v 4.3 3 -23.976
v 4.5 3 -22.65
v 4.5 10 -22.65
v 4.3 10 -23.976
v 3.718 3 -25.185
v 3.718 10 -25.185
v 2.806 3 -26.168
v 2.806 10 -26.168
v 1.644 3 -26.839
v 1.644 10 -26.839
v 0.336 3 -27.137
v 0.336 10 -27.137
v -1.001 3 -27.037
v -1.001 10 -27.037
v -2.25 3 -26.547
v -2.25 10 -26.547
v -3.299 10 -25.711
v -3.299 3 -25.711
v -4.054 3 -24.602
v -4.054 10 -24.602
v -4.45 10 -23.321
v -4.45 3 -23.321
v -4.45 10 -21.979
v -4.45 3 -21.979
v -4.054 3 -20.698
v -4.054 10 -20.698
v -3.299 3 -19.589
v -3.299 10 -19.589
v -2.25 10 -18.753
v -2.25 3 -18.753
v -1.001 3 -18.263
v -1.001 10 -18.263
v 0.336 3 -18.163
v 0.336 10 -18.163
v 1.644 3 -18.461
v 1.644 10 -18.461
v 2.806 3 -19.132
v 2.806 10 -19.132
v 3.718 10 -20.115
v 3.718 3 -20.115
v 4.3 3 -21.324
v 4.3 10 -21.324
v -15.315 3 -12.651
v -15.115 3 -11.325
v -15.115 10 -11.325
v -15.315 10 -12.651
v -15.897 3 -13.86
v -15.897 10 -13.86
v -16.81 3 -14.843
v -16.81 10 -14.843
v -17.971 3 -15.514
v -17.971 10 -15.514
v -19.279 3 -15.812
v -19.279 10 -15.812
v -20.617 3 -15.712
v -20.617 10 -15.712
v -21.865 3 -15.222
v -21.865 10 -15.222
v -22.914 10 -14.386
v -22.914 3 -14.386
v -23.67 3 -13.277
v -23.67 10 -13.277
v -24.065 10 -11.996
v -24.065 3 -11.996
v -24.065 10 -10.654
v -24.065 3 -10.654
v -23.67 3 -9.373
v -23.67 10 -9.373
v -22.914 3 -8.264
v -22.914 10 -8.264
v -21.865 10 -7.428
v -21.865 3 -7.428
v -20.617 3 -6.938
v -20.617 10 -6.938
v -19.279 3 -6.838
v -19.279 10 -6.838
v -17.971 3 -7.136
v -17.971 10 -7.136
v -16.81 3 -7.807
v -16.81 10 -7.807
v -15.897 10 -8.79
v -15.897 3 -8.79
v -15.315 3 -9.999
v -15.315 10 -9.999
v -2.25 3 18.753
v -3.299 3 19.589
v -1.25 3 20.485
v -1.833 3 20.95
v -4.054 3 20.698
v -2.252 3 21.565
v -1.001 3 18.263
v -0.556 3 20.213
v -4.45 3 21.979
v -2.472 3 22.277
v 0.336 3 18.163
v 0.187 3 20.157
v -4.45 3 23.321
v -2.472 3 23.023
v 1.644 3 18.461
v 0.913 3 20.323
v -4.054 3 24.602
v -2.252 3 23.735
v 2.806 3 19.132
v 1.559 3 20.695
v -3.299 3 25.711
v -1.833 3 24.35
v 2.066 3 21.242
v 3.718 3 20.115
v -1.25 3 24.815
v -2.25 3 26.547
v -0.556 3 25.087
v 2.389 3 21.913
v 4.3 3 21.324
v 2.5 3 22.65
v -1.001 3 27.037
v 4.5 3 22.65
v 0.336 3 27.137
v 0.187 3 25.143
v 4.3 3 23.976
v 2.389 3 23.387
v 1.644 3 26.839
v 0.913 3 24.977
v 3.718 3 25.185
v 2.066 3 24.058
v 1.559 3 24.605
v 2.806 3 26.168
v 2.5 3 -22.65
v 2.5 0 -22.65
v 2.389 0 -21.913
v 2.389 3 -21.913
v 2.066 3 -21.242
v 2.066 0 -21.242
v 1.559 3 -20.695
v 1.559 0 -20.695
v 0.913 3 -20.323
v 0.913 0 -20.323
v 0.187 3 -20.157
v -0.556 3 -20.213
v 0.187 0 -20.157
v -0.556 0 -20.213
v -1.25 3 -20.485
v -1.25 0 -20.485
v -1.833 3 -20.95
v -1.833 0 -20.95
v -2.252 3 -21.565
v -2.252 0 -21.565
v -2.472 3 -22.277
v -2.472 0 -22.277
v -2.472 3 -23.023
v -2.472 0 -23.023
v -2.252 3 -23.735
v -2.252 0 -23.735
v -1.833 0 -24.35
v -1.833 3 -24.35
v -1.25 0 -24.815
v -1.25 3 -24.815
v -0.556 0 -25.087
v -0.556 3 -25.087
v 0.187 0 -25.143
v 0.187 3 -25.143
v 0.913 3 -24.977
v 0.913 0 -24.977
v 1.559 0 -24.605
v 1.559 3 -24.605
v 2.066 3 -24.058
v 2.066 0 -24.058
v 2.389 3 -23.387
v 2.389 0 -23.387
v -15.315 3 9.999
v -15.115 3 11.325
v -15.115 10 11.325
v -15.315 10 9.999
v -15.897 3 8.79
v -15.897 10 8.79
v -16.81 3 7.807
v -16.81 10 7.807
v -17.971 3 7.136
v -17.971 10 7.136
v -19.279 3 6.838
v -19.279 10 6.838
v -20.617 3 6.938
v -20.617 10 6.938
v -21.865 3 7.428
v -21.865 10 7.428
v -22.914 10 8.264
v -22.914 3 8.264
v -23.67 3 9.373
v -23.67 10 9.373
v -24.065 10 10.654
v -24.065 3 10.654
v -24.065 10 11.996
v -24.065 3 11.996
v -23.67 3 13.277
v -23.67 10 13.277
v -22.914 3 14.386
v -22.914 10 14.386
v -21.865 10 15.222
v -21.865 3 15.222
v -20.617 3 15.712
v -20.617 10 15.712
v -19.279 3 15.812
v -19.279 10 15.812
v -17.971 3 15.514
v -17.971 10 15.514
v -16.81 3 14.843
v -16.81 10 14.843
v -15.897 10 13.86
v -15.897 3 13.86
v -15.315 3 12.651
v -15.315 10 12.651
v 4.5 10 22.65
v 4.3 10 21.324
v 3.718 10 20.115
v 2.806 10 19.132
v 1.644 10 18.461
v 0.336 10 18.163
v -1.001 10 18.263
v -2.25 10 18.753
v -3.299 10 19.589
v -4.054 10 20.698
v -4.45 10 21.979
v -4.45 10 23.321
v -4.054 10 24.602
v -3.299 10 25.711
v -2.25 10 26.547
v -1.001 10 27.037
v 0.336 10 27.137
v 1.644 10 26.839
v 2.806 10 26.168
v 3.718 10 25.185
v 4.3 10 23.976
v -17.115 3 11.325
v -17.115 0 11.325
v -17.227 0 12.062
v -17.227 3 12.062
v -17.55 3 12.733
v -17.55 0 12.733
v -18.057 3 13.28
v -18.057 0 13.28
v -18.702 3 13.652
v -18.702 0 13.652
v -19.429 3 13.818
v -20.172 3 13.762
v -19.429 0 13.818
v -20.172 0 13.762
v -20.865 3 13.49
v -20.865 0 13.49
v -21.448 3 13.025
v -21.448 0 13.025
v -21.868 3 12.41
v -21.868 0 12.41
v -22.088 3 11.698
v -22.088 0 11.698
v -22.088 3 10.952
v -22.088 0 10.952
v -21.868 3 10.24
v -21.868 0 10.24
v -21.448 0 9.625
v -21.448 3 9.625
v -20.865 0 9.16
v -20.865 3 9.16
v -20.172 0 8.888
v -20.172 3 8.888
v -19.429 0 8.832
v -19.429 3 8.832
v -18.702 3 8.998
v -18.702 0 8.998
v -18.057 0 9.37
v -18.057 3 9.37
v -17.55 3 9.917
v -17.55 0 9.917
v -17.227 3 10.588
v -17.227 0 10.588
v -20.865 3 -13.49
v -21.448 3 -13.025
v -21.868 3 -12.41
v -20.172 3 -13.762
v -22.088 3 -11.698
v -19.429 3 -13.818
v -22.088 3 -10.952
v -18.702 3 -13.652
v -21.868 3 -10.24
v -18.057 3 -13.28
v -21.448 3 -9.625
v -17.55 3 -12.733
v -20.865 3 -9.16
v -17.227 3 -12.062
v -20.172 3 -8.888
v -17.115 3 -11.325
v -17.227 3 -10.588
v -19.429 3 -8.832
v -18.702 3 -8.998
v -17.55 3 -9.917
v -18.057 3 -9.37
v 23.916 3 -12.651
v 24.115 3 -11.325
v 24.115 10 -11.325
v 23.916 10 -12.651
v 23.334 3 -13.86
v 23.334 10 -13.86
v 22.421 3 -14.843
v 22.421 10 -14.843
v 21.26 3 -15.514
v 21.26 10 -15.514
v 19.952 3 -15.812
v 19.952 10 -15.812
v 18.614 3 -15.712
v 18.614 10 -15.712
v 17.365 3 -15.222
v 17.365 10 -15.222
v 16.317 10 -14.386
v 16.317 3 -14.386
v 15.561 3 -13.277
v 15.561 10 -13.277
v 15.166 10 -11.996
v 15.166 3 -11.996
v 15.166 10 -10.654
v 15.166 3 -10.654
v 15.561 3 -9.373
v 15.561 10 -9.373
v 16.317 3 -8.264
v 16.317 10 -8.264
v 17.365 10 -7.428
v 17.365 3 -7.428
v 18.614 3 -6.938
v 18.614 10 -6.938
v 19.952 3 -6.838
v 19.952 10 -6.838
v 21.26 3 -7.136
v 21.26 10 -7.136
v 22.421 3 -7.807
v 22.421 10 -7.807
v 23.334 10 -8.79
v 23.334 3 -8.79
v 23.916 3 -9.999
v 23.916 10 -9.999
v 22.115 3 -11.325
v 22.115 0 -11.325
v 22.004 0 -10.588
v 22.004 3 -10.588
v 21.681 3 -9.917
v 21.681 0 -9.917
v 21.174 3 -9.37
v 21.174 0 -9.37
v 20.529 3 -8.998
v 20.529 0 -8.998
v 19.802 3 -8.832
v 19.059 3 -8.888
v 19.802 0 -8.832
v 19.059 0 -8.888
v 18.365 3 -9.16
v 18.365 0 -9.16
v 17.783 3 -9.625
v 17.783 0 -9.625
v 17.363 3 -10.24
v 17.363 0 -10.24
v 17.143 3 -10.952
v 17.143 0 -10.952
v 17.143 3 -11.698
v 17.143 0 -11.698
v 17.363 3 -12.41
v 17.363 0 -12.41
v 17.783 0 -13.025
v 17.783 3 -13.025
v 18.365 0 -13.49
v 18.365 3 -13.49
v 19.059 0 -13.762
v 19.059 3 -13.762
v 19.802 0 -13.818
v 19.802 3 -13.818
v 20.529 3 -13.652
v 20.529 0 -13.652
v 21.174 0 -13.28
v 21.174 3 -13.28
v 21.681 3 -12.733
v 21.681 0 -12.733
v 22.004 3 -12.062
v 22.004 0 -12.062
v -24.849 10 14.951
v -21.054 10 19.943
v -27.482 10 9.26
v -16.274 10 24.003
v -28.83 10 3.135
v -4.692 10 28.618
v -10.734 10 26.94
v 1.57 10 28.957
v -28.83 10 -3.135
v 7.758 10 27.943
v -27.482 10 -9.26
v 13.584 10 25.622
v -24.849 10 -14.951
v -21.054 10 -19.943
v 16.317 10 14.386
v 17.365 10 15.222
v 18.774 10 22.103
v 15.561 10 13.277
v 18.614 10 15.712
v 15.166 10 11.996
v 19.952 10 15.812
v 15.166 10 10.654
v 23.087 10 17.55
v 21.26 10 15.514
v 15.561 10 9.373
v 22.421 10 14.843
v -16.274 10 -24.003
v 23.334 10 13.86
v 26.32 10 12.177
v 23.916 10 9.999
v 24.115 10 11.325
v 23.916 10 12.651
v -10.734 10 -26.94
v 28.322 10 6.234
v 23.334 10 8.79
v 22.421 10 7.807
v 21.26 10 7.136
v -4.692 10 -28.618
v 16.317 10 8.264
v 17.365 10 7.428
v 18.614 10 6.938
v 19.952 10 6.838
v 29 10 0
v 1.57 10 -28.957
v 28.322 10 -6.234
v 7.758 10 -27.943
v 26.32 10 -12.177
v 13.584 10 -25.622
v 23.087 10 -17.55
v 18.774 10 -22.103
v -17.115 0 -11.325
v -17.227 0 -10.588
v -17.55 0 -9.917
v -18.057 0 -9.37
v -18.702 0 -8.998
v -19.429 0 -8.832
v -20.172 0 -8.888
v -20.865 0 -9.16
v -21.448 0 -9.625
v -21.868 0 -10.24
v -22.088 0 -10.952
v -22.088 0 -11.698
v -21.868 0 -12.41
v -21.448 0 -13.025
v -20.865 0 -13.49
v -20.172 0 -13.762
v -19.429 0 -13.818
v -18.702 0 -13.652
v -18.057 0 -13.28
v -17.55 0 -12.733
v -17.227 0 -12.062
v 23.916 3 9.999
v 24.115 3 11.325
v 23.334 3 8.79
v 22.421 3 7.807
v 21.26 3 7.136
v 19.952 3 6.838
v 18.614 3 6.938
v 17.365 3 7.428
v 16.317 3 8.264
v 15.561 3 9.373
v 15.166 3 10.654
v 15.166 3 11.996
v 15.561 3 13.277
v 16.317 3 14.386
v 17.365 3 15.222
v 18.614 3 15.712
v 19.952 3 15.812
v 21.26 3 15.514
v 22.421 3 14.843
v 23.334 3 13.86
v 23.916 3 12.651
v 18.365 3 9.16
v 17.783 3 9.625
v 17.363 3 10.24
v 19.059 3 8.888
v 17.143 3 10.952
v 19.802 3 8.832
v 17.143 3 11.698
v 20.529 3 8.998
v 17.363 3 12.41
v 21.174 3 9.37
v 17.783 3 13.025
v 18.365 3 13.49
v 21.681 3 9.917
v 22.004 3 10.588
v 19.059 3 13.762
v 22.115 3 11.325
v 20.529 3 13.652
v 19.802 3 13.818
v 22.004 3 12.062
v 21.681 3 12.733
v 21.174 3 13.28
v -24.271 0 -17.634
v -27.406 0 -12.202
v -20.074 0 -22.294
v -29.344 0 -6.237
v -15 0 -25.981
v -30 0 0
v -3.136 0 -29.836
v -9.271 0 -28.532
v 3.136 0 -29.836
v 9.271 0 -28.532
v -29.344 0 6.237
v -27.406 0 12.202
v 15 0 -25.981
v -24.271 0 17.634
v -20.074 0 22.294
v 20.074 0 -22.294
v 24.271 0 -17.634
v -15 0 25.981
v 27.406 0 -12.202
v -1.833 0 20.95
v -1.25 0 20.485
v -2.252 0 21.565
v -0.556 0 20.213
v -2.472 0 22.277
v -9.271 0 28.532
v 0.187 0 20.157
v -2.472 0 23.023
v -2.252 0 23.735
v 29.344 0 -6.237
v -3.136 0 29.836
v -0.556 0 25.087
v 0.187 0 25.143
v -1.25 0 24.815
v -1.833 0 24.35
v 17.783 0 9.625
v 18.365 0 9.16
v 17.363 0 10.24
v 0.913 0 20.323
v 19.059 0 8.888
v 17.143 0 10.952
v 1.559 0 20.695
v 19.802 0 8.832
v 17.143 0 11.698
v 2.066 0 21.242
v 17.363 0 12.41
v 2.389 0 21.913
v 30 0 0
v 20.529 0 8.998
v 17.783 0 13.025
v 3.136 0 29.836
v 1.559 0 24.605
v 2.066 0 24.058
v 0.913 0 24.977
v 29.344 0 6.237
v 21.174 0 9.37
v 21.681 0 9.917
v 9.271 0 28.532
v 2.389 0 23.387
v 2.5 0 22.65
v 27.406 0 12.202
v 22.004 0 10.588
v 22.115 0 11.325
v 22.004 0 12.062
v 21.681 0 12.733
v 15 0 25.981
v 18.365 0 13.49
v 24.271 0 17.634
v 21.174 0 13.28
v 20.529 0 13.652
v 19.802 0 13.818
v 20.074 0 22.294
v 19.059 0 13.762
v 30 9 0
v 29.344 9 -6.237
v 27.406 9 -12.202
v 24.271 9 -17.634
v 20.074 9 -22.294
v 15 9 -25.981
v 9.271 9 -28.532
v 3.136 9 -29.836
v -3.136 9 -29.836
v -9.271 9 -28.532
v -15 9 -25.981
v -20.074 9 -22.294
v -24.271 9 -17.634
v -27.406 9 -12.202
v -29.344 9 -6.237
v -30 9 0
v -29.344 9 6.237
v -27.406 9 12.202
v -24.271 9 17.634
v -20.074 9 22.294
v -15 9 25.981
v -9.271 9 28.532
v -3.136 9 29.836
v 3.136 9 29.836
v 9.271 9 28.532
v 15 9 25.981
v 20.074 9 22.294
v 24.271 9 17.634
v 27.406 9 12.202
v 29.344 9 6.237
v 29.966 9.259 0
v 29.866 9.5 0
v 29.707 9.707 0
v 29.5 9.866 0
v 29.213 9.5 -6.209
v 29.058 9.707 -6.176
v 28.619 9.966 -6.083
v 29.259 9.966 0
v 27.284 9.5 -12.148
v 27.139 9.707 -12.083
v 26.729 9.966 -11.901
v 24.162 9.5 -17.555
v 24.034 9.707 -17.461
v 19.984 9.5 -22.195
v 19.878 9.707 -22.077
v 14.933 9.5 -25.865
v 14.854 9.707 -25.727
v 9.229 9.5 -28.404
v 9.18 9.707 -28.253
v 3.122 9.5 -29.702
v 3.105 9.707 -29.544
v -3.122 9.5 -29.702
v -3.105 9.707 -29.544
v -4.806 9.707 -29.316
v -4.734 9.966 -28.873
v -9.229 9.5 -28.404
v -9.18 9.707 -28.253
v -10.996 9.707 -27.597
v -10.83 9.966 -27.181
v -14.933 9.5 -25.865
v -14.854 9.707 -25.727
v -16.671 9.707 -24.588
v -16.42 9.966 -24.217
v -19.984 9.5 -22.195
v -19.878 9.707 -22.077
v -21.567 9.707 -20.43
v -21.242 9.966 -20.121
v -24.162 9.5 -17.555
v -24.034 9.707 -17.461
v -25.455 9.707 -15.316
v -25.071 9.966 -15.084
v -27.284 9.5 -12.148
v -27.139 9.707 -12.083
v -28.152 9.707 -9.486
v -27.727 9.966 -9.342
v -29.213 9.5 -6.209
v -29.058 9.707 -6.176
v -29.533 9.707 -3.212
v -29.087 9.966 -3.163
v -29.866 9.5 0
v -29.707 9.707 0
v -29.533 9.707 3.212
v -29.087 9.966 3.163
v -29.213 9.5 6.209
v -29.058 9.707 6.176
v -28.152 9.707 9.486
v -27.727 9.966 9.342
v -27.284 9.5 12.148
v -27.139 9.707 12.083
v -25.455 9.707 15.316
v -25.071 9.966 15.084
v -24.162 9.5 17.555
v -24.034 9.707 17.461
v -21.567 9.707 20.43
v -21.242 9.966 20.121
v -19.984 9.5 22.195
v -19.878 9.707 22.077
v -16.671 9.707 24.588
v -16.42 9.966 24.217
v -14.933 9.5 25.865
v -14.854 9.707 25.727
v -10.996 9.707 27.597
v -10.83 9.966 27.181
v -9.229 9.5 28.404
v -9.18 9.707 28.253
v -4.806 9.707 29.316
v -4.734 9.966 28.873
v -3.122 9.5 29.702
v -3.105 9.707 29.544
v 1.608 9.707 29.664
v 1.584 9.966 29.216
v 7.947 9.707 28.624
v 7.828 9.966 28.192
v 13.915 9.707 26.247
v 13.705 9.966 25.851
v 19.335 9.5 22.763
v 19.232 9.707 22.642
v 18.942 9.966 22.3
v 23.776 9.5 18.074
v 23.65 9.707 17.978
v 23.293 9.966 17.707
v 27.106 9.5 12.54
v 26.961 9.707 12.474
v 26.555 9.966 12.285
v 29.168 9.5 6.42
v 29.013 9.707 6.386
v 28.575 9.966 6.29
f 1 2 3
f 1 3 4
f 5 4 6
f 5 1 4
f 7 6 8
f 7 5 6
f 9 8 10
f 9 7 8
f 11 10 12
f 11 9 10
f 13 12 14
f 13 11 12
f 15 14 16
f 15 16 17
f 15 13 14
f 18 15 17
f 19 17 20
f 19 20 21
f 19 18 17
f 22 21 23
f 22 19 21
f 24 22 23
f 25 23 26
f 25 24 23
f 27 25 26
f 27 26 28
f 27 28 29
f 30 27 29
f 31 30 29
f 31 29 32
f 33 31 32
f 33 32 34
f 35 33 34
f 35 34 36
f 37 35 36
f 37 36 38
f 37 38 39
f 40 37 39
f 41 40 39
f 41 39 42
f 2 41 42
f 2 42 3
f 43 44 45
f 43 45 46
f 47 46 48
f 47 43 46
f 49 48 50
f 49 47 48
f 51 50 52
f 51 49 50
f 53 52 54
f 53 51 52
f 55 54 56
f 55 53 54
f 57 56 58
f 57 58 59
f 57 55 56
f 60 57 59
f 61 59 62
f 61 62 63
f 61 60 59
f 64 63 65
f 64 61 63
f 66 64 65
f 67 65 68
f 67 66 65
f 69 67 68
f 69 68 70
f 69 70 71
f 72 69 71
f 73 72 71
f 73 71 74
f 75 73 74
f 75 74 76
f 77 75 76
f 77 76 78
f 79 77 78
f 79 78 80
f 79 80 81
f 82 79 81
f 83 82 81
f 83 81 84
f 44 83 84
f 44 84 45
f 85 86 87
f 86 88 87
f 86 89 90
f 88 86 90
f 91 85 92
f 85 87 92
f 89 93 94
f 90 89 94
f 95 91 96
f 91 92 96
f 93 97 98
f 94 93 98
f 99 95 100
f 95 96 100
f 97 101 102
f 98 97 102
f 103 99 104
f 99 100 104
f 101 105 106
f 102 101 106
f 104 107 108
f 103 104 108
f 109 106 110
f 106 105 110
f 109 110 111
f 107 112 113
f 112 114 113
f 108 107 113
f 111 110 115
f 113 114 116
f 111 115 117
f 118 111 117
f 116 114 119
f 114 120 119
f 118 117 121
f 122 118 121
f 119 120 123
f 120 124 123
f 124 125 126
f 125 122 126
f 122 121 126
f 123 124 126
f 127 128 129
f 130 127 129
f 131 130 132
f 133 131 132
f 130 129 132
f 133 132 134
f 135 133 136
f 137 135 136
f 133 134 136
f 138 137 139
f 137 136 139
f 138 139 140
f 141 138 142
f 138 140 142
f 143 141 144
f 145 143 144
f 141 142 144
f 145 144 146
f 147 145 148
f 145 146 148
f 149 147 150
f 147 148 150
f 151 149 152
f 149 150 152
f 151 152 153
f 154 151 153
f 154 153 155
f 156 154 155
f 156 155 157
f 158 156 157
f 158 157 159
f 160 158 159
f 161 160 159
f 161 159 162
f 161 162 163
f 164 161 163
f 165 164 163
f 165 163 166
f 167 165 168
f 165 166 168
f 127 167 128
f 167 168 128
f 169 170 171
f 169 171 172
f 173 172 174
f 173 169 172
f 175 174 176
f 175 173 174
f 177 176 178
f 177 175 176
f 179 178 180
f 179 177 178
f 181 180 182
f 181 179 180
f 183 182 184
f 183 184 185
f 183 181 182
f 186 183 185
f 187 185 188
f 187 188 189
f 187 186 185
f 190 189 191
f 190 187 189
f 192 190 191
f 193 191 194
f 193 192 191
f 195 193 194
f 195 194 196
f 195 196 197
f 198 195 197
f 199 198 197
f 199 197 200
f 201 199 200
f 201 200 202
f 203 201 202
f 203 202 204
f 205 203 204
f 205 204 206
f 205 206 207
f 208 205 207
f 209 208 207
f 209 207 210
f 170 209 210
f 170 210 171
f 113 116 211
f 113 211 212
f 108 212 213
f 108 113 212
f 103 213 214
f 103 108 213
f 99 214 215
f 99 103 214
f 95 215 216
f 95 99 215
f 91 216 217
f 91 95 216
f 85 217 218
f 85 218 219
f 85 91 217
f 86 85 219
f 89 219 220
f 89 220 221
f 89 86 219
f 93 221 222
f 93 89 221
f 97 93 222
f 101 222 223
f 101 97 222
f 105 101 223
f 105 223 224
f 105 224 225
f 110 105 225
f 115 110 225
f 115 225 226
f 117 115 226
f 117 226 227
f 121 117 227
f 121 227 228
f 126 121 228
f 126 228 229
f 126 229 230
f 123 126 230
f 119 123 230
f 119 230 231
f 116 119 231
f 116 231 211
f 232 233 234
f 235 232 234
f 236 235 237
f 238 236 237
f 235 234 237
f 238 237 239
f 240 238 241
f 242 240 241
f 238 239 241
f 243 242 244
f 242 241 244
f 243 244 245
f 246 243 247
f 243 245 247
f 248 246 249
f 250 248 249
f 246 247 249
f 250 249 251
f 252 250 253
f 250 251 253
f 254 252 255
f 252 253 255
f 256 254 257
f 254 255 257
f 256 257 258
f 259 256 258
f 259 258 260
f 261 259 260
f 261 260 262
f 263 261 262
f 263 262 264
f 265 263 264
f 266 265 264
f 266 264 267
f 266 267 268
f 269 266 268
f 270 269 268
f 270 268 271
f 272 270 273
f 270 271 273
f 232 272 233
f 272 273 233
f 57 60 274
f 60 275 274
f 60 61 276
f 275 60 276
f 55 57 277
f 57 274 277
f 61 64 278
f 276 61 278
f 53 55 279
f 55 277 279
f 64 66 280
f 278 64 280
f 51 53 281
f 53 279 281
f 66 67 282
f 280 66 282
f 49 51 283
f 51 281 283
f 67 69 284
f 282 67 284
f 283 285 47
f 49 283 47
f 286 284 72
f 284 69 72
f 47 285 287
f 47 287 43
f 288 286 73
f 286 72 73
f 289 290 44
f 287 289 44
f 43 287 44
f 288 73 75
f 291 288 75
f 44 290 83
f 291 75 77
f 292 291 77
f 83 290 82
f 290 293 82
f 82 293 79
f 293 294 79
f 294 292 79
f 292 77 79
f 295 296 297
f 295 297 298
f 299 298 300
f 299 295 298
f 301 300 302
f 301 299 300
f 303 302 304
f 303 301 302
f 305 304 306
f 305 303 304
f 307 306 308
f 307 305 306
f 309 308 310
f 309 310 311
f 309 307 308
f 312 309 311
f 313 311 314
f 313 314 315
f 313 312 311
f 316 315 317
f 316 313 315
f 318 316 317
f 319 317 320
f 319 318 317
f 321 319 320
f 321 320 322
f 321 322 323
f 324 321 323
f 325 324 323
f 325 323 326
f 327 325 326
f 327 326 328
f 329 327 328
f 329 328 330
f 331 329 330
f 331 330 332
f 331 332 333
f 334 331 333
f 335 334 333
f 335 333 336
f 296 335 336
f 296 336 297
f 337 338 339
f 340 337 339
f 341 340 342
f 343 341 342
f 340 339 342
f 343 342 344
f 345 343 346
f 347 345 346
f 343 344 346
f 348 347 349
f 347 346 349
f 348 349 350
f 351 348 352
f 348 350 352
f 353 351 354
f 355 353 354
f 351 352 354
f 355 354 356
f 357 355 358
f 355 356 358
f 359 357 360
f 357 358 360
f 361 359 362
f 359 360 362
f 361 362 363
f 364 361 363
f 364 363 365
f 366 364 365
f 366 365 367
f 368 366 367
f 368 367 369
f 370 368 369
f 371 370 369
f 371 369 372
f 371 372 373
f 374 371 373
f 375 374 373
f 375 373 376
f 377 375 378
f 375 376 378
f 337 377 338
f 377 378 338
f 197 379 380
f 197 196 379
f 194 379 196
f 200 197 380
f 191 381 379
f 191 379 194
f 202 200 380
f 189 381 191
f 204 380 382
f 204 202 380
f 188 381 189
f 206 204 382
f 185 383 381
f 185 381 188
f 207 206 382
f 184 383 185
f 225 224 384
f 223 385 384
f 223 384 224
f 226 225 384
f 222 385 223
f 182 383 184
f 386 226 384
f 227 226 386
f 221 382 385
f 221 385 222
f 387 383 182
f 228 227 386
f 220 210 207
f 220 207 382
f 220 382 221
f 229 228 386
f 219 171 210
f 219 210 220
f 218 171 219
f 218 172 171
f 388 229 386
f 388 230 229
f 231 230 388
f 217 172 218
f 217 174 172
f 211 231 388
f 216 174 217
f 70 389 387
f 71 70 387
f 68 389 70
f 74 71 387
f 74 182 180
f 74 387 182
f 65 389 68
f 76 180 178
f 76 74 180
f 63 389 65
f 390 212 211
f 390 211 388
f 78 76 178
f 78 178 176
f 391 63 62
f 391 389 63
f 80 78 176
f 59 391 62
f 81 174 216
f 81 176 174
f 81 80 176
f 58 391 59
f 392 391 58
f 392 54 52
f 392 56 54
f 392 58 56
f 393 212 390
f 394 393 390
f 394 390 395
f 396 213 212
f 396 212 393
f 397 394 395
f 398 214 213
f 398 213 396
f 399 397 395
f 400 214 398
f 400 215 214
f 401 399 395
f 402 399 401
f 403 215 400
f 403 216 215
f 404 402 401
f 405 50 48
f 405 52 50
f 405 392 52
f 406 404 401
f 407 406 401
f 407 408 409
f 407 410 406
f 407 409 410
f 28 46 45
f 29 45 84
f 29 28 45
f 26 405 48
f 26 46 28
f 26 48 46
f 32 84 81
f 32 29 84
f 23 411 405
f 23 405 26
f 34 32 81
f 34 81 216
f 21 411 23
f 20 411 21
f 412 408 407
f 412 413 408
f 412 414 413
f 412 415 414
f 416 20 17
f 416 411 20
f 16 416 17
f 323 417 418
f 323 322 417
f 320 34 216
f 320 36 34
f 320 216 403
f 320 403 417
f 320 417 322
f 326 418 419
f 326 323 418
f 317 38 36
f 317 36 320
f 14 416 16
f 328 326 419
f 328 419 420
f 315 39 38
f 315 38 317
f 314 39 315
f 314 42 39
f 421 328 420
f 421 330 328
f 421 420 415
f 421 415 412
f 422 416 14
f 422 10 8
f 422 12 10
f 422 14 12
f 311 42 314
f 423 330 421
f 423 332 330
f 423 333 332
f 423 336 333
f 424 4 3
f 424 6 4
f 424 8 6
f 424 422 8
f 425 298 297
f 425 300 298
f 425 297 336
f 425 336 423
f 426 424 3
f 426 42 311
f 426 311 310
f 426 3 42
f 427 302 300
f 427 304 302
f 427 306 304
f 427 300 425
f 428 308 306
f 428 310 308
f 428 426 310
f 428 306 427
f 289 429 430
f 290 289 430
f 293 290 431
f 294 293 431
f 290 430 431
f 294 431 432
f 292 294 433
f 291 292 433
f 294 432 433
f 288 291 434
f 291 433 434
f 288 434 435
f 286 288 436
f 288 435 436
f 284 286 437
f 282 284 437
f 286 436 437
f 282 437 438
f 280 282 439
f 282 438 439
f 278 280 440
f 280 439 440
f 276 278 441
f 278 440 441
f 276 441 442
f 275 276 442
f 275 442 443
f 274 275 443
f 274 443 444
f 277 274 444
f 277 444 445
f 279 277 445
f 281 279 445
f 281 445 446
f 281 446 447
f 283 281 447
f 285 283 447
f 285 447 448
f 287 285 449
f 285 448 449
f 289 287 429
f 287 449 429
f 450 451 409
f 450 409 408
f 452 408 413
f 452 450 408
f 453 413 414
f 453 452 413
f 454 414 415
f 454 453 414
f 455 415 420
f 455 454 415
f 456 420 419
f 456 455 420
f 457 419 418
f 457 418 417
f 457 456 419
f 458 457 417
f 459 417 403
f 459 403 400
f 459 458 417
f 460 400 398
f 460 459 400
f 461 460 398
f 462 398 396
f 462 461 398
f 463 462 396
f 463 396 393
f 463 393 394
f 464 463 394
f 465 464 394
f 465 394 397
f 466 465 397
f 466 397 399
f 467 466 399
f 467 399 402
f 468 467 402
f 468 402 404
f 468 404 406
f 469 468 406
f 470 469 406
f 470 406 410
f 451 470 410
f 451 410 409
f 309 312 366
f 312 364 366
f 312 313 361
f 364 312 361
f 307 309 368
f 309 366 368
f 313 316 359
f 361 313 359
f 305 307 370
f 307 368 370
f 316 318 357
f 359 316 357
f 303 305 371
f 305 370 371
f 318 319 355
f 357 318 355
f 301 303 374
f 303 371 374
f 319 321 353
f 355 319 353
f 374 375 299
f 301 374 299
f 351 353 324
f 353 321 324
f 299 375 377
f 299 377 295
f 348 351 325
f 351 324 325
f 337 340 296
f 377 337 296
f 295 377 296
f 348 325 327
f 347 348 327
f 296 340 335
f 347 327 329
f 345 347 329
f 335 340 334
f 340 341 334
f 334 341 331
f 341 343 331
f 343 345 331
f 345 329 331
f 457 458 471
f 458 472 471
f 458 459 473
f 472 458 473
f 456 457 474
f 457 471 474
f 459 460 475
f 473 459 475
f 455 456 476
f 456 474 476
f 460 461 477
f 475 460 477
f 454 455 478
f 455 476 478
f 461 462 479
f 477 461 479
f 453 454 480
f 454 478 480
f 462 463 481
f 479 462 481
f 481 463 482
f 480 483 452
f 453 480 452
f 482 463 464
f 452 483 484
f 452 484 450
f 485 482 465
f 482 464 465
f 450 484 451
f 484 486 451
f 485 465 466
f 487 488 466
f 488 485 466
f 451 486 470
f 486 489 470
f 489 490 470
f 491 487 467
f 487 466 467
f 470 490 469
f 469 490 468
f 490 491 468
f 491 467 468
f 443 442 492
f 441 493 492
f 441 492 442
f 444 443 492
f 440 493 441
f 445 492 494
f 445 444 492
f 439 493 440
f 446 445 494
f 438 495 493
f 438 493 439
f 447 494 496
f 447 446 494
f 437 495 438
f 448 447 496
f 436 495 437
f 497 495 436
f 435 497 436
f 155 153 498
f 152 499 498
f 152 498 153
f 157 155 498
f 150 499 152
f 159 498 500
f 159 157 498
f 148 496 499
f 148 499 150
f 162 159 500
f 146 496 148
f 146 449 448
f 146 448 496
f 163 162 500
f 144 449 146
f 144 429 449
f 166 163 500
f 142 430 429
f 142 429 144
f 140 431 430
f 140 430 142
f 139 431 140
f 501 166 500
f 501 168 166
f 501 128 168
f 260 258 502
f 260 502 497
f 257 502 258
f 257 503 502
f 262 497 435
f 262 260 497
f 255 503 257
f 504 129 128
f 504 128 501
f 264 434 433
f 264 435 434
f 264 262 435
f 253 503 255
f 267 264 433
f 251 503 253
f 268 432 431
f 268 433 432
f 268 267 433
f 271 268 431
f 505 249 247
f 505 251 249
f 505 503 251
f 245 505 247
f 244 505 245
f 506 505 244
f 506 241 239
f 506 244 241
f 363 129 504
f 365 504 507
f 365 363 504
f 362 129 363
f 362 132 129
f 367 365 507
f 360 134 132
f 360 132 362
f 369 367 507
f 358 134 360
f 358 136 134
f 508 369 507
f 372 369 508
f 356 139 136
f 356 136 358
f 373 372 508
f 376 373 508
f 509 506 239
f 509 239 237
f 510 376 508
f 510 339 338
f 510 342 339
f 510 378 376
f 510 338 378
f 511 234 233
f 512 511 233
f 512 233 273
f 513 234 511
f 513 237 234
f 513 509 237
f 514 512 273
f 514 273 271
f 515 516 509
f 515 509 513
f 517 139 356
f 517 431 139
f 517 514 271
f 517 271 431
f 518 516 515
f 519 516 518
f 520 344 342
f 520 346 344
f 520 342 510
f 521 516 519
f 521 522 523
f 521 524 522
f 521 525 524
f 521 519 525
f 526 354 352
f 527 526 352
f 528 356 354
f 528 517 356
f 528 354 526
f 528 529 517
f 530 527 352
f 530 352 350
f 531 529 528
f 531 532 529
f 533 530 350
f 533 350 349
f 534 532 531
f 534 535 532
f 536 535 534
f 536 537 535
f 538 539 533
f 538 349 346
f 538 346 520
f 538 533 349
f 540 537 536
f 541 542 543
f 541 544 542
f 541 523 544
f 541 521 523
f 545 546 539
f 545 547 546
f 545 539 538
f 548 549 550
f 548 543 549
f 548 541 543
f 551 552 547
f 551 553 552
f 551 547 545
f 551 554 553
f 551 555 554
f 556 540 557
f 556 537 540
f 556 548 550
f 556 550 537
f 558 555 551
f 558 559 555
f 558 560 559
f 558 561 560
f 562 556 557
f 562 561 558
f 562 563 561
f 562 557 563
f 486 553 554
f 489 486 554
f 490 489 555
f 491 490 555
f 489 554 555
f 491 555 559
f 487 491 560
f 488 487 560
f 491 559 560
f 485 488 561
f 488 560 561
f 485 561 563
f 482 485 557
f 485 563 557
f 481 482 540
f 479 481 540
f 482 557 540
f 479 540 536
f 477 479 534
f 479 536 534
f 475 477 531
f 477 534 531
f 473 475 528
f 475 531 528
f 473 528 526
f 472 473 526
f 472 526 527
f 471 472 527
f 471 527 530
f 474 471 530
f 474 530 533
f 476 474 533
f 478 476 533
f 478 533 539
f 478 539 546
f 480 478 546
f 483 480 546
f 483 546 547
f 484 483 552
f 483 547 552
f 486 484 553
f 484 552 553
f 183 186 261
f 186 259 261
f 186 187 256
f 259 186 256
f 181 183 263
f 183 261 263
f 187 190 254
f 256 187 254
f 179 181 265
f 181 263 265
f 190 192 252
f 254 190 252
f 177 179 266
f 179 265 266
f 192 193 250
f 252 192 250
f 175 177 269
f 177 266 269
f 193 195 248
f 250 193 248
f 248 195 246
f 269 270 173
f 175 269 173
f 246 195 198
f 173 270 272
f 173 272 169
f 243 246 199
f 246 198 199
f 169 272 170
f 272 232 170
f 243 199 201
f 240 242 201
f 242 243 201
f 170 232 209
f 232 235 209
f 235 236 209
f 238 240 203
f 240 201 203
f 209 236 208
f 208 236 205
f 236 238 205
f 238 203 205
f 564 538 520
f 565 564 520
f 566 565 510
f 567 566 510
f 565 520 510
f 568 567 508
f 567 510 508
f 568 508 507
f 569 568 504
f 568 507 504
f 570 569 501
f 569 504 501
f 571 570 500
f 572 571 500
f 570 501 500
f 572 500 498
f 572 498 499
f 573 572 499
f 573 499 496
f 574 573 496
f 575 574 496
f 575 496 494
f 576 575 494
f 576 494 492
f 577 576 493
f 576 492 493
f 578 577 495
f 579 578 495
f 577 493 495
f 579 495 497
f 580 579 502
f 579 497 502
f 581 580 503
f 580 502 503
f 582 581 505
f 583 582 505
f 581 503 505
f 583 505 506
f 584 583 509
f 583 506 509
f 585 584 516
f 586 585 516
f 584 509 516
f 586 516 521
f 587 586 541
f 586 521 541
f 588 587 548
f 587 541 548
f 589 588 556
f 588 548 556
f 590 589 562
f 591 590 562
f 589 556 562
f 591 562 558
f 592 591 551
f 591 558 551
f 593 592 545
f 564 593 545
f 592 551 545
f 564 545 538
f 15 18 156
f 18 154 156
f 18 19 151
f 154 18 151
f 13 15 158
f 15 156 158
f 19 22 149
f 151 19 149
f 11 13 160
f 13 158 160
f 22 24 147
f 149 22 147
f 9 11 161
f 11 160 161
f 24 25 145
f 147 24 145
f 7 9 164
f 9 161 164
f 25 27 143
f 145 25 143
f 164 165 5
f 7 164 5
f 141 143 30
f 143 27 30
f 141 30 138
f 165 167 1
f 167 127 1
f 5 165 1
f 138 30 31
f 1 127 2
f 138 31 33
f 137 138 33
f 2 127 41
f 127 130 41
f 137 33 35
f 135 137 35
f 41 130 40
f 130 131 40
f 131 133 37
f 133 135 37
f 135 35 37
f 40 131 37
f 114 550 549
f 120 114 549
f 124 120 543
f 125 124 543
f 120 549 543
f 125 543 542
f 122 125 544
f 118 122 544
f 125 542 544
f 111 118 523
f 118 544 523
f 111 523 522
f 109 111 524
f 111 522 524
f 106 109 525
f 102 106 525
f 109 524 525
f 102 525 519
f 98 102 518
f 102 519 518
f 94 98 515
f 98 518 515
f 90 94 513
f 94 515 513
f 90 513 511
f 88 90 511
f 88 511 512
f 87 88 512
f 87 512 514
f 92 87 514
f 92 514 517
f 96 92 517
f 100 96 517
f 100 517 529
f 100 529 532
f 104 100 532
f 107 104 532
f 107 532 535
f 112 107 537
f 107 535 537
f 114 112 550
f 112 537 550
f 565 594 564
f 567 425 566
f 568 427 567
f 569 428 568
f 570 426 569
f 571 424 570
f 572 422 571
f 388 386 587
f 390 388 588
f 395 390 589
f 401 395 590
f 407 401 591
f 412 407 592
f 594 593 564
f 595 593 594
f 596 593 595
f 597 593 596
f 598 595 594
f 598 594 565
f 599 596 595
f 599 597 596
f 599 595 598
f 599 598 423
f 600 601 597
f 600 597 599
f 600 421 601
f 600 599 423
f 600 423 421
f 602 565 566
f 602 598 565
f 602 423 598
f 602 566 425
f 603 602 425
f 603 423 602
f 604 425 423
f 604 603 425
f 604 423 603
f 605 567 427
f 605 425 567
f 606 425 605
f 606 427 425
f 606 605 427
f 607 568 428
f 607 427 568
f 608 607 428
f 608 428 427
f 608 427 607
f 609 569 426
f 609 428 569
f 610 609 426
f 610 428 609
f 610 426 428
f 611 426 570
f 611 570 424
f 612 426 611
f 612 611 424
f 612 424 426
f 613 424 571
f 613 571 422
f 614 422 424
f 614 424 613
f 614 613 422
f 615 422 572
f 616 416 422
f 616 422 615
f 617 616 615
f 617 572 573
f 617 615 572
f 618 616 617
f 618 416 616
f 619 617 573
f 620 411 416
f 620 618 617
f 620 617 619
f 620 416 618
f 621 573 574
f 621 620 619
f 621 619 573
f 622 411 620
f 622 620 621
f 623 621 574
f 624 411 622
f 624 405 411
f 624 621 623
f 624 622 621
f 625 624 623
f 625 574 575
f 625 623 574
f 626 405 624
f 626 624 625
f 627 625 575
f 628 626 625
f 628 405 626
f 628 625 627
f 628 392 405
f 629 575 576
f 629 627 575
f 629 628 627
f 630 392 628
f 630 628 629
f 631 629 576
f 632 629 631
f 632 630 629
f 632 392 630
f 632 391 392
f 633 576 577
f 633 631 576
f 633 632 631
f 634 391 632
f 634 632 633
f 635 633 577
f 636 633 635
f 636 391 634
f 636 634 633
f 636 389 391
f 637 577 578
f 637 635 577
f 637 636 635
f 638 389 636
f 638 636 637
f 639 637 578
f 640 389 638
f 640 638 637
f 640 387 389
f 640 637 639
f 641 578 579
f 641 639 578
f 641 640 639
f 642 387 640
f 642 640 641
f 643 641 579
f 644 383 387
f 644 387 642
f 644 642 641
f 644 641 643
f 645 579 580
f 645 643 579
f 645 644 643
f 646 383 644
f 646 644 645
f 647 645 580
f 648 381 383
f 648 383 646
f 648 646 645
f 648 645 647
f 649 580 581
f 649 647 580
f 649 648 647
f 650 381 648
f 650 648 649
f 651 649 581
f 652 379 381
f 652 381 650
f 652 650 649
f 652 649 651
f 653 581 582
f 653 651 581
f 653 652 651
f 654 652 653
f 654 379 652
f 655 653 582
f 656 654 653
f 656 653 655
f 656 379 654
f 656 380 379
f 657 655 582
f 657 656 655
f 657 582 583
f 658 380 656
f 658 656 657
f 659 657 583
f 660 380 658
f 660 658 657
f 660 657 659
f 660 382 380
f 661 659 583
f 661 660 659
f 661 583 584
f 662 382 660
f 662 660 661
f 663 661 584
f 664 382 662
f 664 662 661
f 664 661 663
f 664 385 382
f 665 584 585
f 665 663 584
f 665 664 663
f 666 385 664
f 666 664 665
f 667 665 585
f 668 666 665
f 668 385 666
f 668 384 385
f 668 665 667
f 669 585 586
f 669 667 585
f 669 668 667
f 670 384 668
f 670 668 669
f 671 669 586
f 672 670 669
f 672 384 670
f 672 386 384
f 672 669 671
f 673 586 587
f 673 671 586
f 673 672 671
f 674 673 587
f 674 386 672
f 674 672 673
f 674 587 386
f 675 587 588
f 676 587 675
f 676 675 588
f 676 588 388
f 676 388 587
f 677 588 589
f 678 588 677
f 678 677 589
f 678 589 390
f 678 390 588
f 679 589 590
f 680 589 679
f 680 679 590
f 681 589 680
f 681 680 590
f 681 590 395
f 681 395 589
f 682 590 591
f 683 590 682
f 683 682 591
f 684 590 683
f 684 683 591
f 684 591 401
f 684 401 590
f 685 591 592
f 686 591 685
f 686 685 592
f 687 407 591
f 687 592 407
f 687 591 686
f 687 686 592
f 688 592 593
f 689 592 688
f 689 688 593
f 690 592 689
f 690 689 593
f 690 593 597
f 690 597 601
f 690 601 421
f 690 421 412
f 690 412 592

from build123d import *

# Parameters (mm, degrees)
SKETCH_1_R      = 30
SKETCH_1_R_2    = 4.5
EXTRUDE_2_DEPTH = 10
SKETCH_3_R      = 4.5
SKETCH_3_R_2    = 2.5
EXTRUDE_3_DEPTH = 3
FILLET_1_R      = 1


with BuildPart() as part:
    # ｽｹｯﾁ1 → ﾎﾞｽ - 押し出し2 (new body)
    with BuildSketch(Plane(origin=(0, 0, 0), x_dir=(1, 0, 0), z_dir=(0, 1, 0))):
        Circle(SKETCH_1_R)
        with Locations((0, -22.65)):
            Circle(SKETCH_1_R_2, mode=Mode.SUBTRACT)
        with Locations((-19.615475396, -11.325)):
            Circle(SKETCH_1_R_2, mode=Mode.SUBTRACT)
        with Locations((-19.615475396, 11.325)):
            Circle(SKETCH_1_R_2, mode=Mode.SUBTRACT)
        with Locations((0, 22.65)):
            Circle(SKETCH_1_R_2, mode=Mode.SUBTRACT)
        with Locations((19.615475396, 11.325)):
            Circle(SKETCH_1_R_2, mode=Mode.SUBTRACT)
        with Locations((19.615475396, -11.325)):
            Circle(SKETCH_1_R_2, mode=Mode.SUBTRACT)
    extrude(amount=EXTRUDE_2_DEPTH)

    # ｽｹｯﾁ3 → ﾎﾞｽ - 押し出し3 (add)
    with BuildSketch(Plane.XZ):
        with Locations((-19.615475396, -11.325)):
            Circle(SKETCH_3_R)
        with Locations((-19.615475396, -11.325)):
            Circle(SKETCH_3_R_2, mode=Mode.SUBTRACT)
        with Locations((-19.615475396, 11.325)):
            Circle(SKETCH_3_R)
        with Locations((-19.615475396, 11.325)):
            Circle(SKETCH_3_R_2, mode=Mode.SUBTRACT)
        with Locations((0, 22.65)):
            Circle(SKETCH_3_R)
        with Locations((0, 22.65)):
            Circle(SKETCH_3_R_2, mode=Mode.SUBTRACT)
        with Locations((19.615475396, 11.325)):
            Circle(SKETCH_3_R)
        with Locations((19.615475396, 11.325)):
            Circle(SKETCH_3_R_2, mode=Mode.SUBTRACT)
        with Locations((19.615475396, -11.325)):
            Circle(SKETCH_3_R)
        with Locations((19.615475396, -11.325)):
            Circle(SKETCH_3_R_2, mode=Mode.SUBTRACT)
        with Locations((0, -22.65)):
            Circle(SKETCH_3_R)
        with Locations((0, -22.65)):
            Circle(SKETCH_3_R_2, mode=Mode.SUBTRACT)
    extrude(amount=-EXTRUDE_3_DEPTH)

    # ﾌｨﾚｯﾄ1
    fillet_1_edges = [part.edges().sort_by_distance(p)[0] for p in [
        (-30, 10, 0),
    ]]
    fillet(fillet_1_edges, radius=FILLET_1_R)


solid = part.part
